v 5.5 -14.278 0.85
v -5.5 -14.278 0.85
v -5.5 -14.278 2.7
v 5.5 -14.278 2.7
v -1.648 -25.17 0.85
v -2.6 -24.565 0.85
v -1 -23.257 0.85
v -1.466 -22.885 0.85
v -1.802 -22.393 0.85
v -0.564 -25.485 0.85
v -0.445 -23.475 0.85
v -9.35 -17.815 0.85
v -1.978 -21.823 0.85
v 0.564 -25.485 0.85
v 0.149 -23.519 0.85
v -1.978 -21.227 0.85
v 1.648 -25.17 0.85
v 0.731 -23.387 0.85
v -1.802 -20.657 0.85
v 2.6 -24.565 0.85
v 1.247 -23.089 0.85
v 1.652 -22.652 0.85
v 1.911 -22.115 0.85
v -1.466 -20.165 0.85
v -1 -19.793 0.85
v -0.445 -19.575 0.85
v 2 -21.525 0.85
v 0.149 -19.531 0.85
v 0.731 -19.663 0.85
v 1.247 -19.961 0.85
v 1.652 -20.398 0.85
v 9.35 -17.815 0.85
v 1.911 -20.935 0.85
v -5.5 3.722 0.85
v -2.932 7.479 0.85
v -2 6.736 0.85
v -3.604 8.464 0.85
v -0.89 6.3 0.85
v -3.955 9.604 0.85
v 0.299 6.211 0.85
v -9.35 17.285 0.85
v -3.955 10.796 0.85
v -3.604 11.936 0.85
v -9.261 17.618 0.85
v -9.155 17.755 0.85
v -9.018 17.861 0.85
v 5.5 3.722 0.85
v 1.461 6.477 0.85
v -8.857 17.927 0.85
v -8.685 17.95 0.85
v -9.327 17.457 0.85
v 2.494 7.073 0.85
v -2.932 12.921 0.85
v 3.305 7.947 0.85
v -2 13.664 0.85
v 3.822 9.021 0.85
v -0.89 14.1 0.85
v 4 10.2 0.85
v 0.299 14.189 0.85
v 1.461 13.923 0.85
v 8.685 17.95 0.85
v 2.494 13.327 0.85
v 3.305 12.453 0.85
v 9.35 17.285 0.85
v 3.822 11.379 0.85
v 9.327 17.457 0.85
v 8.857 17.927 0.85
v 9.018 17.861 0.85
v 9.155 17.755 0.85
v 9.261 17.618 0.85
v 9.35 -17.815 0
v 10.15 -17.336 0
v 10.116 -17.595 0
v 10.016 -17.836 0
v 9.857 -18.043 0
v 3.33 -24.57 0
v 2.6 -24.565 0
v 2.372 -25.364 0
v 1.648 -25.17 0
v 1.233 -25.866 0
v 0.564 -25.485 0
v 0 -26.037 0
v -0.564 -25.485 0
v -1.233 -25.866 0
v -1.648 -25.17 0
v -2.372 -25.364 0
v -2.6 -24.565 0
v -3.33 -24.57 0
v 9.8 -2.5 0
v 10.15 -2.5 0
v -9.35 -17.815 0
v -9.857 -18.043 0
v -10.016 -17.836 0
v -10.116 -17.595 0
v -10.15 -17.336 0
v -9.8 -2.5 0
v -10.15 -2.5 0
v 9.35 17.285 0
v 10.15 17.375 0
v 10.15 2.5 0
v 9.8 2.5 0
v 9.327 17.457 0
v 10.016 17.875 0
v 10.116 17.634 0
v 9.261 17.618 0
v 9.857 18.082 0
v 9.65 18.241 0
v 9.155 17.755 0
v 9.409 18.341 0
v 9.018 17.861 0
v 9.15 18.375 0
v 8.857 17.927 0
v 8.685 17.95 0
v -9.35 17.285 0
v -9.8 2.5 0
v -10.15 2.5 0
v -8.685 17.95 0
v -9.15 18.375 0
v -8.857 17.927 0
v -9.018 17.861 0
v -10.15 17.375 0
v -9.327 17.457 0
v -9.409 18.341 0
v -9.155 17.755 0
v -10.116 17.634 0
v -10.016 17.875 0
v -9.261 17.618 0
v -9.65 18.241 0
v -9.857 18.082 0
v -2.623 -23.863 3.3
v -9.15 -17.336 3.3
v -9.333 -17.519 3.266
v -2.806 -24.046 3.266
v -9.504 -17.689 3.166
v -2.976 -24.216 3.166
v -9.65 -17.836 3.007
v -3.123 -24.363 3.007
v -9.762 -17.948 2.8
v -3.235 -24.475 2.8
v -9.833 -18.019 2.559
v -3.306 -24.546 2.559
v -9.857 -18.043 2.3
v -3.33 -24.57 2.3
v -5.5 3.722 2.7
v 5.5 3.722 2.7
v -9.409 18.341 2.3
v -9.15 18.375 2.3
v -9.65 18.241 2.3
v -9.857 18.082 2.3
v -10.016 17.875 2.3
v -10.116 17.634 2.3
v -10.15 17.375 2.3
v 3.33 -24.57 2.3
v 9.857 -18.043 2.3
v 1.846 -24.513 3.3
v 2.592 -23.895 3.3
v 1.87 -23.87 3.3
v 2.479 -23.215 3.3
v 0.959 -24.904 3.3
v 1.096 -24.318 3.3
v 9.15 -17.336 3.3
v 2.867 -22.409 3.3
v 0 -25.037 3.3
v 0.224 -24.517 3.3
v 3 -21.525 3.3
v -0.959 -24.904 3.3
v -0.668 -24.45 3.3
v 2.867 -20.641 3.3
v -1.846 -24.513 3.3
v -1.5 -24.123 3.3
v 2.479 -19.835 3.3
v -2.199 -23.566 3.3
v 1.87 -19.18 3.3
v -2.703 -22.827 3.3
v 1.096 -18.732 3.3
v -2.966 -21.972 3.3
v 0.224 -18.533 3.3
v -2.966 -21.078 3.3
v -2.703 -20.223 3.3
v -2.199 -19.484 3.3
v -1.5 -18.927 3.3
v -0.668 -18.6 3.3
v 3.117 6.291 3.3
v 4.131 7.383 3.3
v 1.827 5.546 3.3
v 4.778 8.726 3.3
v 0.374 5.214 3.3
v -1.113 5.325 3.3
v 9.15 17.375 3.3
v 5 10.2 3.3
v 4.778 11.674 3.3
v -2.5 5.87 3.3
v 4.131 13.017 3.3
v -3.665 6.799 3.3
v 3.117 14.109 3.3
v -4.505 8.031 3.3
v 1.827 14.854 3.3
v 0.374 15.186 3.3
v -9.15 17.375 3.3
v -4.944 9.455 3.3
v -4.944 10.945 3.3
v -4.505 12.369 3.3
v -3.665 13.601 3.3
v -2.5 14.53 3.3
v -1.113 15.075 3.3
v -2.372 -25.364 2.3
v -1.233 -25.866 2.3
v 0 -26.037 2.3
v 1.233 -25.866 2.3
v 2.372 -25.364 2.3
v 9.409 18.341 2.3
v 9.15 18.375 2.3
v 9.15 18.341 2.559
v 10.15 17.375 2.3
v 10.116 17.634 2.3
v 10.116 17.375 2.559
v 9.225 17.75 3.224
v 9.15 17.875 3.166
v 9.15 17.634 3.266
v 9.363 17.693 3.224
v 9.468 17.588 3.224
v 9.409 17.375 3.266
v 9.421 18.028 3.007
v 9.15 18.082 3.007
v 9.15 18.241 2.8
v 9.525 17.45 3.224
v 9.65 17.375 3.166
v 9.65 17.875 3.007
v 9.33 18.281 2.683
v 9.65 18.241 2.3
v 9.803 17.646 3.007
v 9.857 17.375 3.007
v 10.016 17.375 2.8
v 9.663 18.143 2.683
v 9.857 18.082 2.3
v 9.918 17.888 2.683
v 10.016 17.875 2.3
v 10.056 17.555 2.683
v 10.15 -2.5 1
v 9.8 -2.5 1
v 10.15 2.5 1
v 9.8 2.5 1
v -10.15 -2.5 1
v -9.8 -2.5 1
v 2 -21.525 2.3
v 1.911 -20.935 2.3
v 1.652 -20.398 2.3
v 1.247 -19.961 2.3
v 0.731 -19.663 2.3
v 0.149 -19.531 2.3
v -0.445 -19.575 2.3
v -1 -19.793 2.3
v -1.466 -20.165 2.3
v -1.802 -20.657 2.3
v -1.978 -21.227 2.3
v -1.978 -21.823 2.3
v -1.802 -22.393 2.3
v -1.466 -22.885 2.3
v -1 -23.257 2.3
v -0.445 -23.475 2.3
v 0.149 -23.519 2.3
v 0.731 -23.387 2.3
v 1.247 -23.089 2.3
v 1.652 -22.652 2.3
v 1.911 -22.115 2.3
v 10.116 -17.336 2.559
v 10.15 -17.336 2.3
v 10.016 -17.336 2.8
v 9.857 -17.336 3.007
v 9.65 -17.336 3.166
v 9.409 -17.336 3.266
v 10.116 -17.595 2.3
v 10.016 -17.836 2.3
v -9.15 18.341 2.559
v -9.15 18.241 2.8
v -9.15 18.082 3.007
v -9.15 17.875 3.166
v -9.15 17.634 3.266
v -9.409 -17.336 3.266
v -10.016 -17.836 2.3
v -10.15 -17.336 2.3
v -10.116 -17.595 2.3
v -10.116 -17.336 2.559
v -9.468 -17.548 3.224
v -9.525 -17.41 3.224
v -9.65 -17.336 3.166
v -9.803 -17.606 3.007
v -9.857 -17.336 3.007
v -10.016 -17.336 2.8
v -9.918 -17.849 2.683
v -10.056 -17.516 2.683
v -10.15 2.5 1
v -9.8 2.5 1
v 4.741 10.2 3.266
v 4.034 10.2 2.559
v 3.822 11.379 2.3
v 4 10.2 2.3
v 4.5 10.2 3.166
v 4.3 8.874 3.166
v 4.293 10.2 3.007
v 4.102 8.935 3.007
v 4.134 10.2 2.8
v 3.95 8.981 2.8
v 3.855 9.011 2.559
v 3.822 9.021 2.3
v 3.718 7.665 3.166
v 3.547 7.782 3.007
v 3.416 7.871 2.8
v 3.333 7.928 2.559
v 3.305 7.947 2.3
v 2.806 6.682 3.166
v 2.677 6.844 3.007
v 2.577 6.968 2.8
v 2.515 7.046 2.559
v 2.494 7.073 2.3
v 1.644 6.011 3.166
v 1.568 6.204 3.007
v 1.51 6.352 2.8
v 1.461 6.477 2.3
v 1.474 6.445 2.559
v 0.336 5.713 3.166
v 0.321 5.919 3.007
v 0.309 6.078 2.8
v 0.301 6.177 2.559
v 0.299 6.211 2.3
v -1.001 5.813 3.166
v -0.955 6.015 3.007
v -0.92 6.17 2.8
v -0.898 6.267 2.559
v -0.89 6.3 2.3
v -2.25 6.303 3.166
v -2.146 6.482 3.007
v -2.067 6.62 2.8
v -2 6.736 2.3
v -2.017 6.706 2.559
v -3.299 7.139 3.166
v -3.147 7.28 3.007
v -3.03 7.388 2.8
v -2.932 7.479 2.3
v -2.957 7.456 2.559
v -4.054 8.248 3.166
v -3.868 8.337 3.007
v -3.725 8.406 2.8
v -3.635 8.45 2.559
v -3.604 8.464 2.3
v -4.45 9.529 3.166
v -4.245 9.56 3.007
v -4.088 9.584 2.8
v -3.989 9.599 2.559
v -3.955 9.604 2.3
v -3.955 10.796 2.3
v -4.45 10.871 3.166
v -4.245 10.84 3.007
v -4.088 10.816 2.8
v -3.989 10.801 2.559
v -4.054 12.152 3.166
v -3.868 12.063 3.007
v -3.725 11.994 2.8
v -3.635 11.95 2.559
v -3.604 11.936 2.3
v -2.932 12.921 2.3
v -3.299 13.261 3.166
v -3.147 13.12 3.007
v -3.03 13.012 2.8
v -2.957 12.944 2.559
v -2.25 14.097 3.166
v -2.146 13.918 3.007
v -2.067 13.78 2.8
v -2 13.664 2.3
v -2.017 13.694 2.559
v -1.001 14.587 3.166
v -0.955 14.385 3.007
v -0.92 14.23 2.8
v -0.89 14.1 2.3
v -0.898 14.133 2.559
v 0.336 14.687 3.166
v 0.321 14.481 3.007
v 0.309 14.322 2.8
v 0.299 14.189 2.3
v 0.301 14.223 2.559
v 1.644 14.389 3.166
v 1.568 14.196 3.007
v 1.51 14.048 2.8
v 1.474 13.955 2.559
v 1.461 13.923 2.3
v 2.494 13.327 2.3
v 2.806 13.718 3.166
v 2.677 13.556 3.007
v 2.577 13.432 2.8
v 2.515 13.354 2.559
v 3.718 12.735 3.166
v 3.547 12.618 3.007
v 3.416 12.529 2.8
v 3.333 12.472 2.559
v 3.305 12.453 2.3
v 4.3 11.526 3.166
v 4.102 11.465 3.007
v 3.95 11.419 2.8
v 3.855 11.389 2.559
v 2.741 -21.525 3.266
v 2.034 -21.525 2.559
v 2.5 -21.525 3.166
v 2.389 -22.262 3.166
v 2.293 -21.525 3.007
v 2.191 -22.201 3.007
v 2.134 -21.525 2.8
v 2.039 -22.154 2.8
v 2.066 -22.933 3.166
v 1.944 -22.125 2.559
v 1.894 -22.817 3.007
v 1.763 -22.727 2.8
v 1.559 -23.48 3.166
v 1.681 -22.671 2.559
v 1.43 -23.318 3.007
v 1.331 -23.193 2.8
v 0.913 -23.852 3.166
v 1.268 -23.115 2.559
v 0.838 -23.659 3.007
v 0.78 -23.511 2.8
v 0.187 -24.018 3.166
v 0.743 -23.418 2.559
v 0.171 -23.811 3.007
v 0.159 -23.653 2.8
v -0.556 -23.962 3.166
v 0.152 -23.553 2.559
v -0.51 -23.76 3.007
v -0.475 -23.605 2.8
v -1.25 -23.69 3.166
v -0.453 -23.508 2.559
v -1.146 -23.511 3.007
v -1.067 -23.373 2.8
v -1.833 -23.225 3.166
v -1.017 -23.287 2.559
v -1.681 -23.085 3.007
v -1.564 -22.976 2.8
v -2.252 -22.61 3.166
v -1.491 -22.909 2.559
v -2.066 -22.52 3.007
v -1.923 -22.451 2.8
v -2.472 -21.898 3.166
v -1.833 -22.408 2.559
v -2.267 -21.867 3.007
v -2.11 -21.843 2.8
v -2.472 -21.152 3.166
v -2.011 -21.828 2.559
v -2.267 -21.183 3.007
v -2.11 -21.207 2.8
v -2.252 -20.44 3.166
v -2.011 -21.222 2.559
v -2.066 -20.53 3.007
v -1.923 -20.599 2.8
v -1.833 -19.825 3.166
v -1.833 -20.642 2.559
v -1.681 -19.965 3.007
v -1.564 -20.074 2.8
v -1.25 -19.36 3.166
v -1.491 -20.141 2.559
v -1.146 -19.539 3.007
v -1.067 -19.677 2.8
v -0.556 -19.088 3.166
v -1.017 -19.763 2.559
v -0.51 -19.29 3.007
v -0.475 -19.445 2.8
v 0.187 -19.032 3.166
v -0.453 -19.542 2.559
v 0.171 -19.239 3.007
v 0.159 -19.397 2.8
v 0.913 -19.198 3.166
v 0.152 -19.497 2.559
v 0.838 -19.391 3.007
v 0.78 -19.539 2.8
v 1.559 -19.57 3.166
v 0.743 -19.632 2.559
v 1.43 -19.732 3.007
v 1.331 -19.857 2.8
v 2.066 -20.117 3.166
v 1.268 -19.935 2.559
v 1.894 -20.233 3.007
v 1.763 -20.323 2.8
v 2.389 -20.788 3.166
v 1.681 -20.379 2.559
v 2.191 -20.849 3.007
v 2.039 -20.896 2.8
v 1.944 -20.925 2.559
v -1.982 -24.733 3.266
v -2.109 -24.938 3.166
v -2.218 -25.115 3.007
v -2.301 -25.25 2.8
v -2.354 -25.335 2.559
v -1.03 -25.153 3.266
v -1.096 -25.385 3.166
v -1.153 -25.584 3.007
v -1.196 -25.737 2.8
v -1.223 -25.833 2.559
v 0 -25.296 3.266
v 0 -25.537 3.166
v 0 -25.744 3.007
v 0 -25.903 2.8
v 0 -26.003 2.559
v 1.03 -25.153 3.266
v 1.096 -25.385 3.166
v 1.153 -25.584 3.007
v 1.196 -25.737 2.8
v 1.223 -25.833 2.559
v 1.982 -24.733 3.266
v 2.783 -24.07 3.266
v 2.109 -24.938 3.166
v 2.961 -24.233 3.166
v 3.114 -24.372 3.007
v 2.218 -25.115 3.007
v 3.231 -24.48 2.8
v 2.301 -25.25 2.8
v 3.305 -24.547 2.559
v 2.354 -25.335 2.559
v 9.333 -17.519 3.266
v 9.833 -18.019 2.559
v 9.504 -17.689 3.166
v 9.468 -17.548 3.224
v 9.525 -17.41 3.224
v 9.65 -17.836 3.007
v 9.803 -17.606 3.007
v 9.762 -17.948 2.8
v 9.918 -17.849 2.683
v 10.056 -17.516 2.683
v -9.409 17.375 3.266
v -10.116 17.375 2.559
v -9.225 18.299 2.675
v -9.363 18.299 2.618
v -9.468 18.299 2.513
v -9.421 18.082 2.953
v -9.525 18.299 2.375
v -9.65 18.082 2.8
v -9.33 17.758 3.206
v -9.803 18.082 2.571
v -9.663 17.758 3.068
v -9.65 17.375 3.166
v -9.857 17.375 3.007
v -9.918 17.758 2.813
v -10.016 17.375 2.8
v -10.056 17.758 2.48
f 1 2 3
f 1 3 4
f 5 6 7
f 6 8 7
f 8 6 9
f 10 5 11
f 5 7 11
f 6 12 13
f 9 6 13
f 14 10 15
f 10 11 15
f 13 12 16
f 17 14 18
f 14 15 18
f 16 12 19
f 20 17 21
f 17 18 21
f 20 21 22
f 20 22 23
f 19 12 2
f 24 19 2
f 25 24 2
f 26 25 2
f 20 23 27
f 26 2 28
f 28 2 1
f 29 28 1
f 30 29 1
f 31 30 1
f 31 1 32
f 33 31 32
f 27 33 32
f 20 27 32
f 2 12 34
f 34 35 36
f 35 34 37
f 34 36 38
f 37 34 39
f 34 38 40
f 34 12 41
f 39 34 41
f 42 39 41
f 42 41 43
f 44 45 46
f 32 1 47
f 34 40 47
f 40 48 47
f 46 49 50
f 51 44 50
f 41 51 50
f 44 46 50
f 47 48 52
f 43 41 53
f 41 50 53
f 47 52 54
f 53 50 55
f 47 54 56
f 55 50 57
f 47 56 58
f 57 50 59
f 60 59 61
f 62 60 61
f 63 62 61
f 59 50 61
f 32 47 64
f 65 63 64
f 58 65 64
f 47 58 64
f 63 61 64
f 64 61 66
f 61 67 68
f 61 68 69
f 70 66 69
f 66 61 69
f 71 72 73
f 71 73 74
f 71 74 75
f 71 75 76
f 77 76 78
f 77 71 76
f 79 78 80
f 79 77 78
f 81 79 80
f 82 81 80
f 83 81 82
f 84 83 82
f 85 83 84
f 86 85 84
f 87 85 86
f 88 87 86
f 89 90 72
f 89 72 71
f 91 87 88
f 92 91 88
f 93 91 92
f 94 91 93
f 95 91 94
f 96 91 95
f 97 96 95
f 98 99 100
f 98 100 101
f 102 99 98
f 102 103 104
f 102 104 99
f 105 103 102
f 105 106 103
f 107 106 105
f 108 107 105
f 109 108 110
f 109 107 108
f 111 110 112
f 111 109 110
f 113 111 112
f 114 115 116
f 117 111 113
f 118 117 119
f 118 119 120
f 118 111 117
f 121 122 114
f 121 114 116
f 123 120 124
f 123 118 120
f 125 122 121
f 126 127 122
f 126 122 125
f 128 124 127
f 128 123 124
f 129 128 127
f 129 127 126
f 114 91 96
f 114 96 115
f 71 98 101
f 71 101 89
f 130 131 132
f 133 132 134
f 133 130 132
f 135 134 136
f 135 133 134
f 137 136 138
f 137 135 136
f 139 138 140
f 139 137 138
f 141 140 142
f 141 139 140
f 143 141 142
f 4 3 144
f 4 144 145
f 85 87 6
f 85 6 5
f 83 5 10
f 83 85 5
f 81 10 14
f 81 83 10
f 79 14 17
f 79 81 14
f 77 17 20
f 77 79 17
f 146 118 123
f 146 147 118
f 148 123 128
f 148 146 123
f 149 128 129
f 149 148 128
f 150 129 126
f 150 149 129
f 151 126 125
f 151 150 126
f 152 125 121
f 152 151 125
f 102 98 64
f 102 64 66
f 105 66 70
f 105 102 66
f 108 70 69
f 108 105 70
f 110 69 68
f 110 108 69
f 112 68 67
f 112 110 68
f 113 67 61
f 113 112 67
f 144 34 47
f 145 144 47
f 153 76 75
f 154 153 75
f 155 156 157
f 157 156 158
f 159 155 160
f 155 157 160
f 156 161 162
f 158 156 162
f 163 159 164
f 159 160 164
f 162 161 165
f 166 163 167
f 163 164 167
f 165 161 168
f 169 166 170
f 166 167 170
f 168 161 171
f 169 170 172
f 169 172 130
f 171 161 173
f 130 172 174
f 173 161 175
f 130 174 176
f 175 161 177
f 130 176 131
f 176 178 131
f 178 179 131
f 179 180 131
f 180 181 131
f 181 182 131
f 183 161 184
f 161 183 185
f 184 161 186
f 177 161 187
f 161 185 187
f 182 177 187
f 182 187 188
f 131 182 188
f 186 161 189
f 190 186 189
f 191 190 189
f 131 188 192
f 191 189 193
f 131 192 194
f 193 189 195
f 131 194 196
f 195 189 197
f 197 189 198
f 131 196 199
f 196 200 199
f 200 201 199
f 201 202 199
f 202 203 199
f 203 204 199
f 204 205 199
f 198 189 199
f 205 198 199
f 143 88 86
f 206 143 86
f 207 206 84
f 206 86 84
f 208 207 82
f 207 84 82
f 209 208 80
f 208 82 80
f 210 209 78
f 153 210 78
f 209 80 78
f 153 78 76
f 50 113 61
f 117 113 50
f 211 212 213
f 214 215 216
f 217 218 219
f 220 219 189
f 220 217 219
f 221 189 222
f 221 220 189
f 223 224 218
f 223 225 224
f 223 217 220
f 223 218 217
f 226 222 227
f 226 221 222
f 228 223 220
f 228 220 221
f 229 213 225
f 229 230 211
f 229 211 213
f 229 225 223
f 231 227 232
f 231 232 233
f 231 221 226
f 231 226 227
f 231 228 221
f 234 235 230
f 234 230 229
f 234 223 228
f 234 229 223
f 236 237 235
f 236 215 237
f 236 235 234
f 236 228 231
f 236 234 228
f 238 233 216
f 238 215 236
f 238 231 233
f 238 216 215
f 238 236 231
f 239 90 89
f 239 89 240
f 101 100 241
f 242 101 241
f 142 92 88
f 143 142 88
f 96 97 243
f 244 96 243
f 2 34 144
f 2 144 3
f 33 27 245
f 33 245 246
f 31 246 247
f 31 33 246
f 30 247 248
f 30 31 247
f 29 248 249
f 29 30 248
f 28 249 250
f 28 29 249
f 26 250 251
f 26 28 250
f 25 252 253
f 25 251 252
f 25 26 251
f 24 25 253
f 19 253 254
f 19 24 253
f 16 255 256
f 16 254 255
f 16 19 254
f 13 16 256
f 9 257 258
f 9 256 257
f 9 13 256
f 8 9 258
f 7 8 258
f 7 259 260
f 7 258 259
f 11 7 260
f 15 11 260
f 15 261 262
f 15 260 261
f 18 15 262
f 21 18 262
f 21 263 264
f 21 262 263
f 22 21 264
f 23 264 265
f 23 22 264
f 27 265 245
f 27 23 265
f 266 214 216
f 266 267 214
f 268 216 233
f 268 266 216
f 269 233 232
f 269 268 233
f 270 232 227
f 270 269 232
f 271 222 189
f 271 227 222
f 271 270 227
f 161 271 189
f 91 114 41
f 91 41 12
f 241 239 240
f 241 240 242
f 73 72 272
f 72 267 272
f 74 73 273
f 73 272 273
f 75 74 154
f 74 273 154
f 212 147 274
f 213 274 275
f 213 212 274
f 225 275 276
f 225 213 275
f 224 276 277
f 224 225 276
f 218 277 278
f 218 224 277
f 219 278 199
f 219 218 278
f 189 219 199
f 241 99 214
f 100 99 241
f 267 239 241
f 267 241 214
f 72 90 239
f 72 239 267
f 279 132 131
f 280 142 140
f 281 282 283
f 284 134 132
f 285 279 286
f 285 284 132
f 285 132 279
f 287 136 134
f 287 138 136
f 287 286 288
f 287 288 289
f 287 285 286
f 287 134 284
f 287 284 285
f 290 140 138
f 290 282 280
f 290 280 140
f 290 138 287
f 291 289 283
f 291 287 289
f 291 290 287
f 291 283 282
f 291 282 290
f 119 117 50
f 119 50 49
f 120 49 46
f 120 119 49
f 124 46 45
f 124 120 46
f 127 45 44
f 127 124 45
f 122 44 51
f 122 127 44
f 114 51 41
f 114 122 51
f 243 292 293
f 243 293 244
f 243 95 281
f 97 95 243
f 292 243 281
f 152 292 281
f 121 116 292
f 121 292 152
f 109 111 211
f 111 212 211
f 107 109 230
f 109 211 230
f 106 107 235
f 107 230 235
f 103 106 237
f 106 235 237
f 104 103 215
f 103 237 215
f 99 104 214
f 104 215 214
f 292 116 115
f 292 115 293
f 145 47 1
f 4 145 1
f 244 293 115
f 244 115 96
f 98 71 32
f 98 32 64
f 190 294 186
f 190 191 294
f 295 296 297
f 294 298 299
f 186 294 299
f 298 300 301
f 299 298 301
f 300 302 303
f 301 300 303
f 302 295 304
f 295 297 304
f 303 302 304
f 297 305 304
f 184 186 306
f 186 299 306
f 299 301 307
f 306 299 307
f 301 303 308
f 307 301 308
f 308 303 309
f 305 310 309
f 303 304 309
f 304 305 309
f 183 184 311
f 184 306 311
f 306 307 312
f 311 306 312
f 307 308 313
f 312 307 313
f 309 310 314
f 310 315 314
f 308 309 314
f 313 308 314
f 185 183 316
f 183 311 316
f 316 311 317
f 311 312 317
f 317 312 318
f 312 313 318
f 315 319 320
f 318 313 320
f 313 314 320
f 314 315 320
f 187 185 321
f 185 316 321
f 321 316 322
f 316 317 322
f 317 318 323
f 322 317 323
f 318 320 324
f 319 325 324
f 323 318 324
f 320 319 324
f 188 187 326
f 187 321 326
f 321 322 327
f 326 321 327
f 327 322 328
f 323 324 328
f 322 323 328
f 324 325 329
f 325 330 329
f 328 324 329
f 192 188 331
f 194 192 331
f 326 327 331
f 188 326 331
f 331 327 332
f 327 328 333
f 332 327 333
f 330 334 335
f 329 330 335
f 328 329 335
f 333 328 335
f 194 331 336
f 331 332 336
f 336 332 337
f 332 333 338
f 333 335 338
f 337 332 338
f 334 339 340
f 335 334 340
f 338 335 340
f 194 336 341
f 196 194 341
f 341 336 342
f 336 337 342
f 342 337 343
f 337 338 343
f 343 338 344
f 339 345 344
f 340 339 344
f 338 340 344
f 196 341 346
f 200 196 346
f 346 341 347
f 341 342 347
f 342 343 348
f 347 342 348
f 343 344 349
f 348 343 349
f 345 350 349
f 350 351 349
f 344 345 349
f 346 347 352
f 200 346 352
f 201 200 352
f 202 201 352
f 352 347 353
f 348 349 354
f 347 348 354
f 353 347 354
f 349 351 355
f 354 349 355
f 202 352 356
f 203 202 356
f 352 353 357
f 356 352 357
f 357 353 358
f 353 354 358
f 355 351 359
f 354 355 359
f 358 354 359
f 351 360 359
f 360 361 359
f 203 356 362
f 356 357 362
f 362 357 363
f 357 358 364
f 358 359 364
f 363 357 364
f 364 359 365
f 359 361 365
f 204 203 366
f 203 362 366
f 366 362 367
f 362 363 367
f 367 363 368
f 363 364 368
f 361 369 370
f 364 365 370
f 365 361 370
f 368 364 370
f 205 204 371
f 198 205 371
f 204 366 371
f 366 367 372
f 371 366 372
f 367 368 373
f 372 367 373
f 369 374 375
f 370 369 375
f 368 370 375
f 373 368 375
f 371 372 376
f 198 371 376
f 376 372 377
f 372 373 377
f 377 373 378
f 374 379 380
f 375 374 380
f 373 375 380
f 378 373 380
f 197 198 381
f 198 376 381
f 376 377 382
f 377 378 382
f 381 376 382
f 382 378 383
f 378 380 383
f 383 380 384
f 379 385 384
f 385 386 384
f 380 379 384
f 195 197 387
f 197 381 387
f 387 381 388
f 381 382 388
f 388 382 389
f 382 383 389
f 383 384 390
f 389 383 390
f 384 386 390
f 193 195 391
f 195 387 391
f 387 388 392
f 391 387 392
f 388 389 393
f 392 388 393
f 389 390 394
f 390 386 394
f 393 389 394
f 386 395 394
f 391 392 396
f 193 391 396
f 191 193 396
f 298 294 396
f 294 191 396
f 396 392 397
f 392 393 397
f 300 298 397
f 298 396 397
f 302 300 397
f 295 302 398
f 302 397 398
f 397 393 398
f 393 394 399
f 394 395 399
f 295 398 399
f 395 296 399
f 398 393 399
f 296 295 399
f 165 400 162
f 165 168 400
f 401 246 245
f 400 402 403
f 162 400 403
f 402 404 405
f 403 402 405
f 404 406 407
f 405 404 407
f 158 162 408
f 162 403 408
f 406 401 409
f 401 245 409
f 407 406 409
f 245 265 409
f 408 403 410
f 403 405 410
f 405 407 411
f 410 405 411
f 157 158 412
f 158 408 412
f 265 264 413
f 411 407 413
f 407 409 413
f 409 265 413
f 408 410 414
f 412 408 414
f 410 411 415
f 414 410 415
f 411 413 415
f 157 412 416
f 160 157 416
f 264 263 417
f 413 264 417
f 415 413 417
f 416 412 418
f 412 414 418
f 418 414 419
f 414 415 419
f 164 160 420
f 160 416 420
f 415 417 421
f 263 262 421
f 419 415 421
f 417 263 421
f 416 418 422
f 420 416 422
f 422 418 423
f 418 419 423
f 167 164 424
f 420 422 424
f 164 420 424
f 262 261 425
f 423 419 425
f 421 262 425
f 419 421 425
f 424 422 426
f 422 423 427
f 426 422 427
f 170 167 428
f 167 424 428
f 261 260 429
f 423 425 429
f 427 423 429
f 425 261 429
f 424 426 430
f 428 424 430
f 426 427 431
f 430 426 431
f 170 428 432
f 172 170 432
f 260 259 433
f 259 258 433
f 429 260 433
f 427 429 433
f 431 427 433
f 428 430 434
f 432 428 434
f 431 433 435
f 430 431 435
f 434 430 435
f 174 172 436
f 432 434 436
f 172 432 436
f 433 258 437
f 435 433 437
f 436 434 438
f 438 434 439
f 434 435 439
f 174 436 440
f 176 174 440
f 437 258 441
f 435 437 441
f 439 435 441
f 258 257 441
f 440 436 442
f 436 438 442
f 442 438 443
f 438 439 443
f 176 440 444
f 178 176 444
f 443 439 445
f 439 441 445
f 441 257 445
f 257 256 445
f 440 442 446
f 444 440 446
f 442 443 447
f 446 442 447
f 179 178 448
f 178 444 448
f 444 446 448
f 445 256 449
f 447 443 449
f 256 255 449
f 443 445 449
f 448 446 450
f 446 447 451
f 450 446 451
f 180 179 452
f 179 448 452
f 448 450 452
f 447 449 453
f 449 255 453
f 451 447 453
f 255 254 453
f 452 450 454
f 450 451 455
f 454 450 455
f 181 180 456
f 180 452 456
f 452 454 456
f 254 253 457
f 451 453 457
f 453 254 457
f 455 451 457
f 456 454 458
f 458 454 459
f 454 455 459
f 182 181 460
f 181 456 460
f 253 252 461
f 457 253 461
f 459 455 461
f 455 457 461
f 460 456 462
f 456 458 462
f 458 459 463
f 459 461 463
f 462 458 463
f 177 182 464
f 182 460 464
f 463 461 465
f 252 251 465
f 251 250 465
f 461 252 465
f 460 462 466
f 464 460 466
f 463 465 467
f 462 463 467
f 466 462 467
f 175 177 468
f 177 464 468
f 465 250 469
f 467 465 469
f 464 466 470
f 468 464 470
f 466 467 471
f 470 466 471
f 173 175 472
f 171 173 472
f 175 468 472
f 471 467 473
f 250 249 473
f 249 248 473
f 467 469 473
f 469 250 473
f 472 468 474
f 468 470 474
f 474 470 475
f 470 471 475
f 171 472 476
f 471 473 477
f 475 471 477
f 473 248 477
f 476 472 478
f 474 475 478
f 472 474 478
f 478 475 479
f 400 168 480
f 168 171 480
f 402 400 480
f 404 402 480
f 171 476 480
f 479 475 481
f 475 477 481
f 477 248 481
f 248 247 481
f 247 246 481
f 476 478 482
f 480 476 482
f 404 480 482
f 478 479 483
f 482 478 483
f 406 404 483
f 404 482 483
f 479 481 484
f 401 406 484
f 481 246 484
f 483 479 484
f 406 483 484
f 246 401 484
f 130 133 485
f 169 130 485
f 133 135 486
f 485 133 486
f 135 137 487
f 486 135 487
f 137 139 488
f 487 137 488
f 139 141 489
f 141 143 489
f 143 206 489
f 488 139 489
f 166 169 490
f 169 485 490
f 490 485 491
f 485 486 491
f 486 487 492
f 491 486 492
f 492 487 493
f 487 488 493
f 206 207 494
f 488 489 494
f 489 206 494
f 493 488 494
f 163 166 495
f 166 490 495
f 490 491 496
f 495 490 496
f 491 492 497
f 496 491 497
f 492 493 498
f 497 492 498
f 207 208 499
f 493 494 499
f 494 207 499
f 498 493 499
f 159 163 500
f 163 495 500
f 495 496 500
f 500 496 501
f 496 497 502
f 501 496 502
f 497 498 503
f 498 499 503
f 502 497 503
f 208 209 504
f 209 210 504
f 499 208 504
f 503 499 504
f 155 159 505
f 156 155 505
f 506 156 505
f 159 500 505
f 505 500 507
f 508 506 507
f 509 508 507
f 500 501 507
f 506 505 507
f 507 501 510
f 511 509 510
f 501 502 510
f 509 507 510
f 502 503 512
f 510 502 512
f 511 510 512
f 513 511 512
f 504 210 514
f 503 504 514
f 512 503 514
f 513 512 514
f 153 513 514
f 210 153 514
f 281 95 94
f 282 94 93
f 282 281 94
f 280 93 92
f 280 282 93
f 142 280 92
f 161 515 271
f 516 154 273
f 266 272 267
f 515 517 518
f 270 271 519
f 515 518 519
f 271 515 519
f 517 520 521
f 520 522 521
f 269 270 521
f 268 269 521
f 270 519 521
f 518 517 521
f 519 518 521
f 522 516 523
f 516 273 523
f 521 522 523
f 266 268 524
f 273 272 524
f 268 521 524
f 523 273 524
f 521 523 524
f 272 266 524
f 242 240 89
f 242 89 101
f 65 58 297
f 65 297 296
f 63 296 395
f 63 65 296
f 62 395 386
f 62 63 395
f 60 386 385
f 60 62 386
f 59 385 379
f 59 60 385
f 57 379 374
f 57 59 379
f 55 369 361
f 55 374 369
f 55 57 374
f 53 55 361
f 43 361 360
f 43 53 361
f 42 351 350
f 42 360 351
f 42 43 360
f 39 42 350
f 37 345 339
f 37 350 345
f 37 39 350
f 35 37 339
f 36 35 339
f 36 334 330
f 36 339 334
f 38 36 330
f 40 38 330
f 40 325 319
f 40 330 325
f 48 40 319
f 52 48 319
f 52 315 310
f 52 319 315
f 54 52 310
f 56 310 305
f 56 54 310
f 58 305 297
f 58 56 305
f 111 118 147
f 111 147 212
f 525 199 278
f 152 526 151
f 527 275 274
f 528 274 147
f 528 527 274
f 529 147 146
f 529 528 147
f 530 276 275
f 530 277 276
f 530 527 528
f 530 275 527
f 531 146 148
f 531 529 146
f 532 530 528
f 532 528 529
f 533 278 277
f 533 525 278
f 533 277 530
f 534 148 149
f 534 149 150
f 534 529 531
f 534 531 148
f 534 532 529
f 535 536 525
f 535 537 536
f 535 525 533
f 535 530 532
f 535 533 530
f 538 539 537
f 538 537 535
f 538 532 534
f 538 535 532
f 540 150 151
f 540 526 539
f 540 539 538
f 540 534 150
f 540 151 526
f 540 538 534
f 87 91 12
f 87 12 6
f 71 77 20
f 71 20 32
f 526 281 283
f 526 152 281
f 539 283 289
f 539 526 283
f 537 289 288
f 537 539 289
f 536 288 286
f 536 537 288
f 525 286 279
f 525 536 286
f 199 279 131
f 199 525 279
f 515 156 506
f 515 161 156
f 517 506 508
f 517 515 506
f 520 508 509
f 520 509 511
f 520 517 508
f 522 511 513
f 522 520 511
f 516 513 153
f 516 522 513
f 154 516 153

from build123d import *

# Parameters (mm, degrees)
PAD003_DEPTH    = 3.3
SKETCH016_R     = 4
POCKET005_DEPTH = 5
SKETCH007_W     = 11
SKETCH007_H     = 18
POCKET006_DEPTH = 2.7
SKETCH008_W     = 5.388972
SKETCH008_H     = 3.069046
POCKET007_DEPTH = 1
SKETCH018_R     = 2
POCKET008_DEPTH = 5
POCKET009_DEPTH = 0.85
SKETCH020_W     = 0.35
SKETCH020_H     = 0.6
POCKET010_DEPTH = 25
FILLET_R        = 1
SKETCH034_W     = 5
SKETCH034_H     = 1
POCKET020_DEPTH = 0.35
SKETCH035_W     = 5
SKETCH035_H     = 1
POCKET021_DEPTH = 0.35


with BuildPart() as part:
    # Sketch005 → Pad003 (new body)
    with BuildSketch(Plane.XY):
        with BuildLine():
            Line((-10.15, 18.375), (10.15, 18.375))
            Line((10.15, 18.375), (10.15, -17.75))
            Line((3.33, -24.57), (10.15, -17.75))
            ThreePointArc((-3.33, -24.57), (0, -26.037308), (3.33, -24.57))
            Line((-10.15, -17.75), (-3.33, -24.57))
            Line((-10.15, -17.75), (-10.15, 18.375))
        make_face()
    extrude(amount=PAD003_DEPTH)

    # Sketch016 → Pocket005 (cut)
    with BuildSketch(Plane.XY):
        with Locations((0, 10.2)):
            Circle(SKETCH016_R)
    extrude(amount=POCKET005_DEPTH, mode=Mode.SUBTRACT)

    # Sketch007 (on Face4 of Pocket005) → Pocket006 (cut)
    with BuildSketch(Plane(origin=(0, 0, 0), x_dir=(1, 0, 0), z_dir=(0, 0, -1))):
        with Locations((0, 5.277613)):
            Rectangle(SKETCH007_W, SKETCH007_H)
    extrude(amount=-POCKET006_DEPTH, mode=Mode.SUBTRACT)

    # Sketch008 → Pocket007 (cut)
    with BuildSketch(Plane.XY):
        with Locations((-2.024069, -8.897589)):
            Rectangle(SKETCH008_W, SKETCH008_H)
    extrude(amount=POCKET007_DEPTH, mode=Mode.SUBTRACT)

    # Sketch018 → Pocket008 (cut)
    with BuildSketch(Plane.XY):
        with Locations((0, -21.525)):
            Circle(SKETCH018_R)
    extrude(amount=POCKET008_DEPTH, mode=Mode.SUBTRACT)

    # Sketch019 → Pocket009 (cut)
    with BuildSketch(Plane.XY):
        with BuildLine():
            Line((-9.35, 17.285263), (-9.35, -17.814737))
            Line((-9.35, -17.814737), (-2.6, -24.564737))
            ThreePointArc((-2.6, -24.564737), (0, -25.525), (2.6, -24.564737))
            Line((2.6, -24.564737), (9.35, -17.814737))
            Line((9.35, -17.814737), (9.35, 17.285263))
            ThreePointArc((9.35, 17.285263), (9.155303, 17.755303), (8.685263, 17.95))
            Line((8.685263, 17.95), (-8.685263, 17.95))
            ThreePointArc((-8.685263, 17.95), (-9.155303, 17.755303), (-9.35, 17.285263))
        make_face()
    extrude(amount=POCKET009_DEPTH, mode=Mode.SUBTRACT)

    # Sketch020 (on Face16 of Pocket009) → Pocket010 (cut)
    with BuildSketch(Plane.YZ.offset(-9.35)):
        with Locations((-9.625, -1.8)):
            Rectangle(SKETCH020_W, SKETCH020_H)
        with Locations((9.625, -1.8)):
            Rectangle(SKETCH020_W, SKETCH020_H)
    extrude(amount=-POCKET010_DEPTH, mode=Mode.SUBTRACT)

    # Fillet
    fillet_edges = [part.edges().sort_by_distance(p)[0] for p in [
        (10.15, -17.75, 1.65),
        (10.15, 18.375, 1.65),
        (-6.74, -21.16, 3.3),
        (-10.15, 0.3125, 3.3),
        (0, -26.037308, 3.3),
        (0, 18.375, 3.3),
        (6.74, -21.16, 3.3),
        (10.15, 0.3125, 3.3),
        (-2, -21.525, 3.3),
        (-4, 10.2, 3.3),
        (-10.15, 18.375, 1.65),
        (-10.15, -17.75, 1.65),
    ]]
    fillet(fillet_edges, radius=FILLET_R)

    # Sketch034 (on Face10 of Fillet) → Pocket020 (cut)
    with BuildSketch(Plane(origin=(-10.15, 0, 0), x_dir=(0, -1, 0), z_dir=(-1, 0, 0))):
        with Locations((0, 0.5)):
            Rectangle(SKETCH034_W, SKETCH034_H)
    extrude(amount=-POCKET020_DEPTH, mode=Mode.SUBTRACT)

    # Sketch035 (on Face11 of Pocket020) → Pocket021 (cut)
    with BuildSketch(Plane.YZ.offset(10.15)):
        with Locations((0, 0.5)):
            Rectangle(SKETCH035_W, SKETCH035_H)
    extrude(amount=-POCKET021_DEPTH, mode=Mode.SUBTRACT)


solid = part.part
